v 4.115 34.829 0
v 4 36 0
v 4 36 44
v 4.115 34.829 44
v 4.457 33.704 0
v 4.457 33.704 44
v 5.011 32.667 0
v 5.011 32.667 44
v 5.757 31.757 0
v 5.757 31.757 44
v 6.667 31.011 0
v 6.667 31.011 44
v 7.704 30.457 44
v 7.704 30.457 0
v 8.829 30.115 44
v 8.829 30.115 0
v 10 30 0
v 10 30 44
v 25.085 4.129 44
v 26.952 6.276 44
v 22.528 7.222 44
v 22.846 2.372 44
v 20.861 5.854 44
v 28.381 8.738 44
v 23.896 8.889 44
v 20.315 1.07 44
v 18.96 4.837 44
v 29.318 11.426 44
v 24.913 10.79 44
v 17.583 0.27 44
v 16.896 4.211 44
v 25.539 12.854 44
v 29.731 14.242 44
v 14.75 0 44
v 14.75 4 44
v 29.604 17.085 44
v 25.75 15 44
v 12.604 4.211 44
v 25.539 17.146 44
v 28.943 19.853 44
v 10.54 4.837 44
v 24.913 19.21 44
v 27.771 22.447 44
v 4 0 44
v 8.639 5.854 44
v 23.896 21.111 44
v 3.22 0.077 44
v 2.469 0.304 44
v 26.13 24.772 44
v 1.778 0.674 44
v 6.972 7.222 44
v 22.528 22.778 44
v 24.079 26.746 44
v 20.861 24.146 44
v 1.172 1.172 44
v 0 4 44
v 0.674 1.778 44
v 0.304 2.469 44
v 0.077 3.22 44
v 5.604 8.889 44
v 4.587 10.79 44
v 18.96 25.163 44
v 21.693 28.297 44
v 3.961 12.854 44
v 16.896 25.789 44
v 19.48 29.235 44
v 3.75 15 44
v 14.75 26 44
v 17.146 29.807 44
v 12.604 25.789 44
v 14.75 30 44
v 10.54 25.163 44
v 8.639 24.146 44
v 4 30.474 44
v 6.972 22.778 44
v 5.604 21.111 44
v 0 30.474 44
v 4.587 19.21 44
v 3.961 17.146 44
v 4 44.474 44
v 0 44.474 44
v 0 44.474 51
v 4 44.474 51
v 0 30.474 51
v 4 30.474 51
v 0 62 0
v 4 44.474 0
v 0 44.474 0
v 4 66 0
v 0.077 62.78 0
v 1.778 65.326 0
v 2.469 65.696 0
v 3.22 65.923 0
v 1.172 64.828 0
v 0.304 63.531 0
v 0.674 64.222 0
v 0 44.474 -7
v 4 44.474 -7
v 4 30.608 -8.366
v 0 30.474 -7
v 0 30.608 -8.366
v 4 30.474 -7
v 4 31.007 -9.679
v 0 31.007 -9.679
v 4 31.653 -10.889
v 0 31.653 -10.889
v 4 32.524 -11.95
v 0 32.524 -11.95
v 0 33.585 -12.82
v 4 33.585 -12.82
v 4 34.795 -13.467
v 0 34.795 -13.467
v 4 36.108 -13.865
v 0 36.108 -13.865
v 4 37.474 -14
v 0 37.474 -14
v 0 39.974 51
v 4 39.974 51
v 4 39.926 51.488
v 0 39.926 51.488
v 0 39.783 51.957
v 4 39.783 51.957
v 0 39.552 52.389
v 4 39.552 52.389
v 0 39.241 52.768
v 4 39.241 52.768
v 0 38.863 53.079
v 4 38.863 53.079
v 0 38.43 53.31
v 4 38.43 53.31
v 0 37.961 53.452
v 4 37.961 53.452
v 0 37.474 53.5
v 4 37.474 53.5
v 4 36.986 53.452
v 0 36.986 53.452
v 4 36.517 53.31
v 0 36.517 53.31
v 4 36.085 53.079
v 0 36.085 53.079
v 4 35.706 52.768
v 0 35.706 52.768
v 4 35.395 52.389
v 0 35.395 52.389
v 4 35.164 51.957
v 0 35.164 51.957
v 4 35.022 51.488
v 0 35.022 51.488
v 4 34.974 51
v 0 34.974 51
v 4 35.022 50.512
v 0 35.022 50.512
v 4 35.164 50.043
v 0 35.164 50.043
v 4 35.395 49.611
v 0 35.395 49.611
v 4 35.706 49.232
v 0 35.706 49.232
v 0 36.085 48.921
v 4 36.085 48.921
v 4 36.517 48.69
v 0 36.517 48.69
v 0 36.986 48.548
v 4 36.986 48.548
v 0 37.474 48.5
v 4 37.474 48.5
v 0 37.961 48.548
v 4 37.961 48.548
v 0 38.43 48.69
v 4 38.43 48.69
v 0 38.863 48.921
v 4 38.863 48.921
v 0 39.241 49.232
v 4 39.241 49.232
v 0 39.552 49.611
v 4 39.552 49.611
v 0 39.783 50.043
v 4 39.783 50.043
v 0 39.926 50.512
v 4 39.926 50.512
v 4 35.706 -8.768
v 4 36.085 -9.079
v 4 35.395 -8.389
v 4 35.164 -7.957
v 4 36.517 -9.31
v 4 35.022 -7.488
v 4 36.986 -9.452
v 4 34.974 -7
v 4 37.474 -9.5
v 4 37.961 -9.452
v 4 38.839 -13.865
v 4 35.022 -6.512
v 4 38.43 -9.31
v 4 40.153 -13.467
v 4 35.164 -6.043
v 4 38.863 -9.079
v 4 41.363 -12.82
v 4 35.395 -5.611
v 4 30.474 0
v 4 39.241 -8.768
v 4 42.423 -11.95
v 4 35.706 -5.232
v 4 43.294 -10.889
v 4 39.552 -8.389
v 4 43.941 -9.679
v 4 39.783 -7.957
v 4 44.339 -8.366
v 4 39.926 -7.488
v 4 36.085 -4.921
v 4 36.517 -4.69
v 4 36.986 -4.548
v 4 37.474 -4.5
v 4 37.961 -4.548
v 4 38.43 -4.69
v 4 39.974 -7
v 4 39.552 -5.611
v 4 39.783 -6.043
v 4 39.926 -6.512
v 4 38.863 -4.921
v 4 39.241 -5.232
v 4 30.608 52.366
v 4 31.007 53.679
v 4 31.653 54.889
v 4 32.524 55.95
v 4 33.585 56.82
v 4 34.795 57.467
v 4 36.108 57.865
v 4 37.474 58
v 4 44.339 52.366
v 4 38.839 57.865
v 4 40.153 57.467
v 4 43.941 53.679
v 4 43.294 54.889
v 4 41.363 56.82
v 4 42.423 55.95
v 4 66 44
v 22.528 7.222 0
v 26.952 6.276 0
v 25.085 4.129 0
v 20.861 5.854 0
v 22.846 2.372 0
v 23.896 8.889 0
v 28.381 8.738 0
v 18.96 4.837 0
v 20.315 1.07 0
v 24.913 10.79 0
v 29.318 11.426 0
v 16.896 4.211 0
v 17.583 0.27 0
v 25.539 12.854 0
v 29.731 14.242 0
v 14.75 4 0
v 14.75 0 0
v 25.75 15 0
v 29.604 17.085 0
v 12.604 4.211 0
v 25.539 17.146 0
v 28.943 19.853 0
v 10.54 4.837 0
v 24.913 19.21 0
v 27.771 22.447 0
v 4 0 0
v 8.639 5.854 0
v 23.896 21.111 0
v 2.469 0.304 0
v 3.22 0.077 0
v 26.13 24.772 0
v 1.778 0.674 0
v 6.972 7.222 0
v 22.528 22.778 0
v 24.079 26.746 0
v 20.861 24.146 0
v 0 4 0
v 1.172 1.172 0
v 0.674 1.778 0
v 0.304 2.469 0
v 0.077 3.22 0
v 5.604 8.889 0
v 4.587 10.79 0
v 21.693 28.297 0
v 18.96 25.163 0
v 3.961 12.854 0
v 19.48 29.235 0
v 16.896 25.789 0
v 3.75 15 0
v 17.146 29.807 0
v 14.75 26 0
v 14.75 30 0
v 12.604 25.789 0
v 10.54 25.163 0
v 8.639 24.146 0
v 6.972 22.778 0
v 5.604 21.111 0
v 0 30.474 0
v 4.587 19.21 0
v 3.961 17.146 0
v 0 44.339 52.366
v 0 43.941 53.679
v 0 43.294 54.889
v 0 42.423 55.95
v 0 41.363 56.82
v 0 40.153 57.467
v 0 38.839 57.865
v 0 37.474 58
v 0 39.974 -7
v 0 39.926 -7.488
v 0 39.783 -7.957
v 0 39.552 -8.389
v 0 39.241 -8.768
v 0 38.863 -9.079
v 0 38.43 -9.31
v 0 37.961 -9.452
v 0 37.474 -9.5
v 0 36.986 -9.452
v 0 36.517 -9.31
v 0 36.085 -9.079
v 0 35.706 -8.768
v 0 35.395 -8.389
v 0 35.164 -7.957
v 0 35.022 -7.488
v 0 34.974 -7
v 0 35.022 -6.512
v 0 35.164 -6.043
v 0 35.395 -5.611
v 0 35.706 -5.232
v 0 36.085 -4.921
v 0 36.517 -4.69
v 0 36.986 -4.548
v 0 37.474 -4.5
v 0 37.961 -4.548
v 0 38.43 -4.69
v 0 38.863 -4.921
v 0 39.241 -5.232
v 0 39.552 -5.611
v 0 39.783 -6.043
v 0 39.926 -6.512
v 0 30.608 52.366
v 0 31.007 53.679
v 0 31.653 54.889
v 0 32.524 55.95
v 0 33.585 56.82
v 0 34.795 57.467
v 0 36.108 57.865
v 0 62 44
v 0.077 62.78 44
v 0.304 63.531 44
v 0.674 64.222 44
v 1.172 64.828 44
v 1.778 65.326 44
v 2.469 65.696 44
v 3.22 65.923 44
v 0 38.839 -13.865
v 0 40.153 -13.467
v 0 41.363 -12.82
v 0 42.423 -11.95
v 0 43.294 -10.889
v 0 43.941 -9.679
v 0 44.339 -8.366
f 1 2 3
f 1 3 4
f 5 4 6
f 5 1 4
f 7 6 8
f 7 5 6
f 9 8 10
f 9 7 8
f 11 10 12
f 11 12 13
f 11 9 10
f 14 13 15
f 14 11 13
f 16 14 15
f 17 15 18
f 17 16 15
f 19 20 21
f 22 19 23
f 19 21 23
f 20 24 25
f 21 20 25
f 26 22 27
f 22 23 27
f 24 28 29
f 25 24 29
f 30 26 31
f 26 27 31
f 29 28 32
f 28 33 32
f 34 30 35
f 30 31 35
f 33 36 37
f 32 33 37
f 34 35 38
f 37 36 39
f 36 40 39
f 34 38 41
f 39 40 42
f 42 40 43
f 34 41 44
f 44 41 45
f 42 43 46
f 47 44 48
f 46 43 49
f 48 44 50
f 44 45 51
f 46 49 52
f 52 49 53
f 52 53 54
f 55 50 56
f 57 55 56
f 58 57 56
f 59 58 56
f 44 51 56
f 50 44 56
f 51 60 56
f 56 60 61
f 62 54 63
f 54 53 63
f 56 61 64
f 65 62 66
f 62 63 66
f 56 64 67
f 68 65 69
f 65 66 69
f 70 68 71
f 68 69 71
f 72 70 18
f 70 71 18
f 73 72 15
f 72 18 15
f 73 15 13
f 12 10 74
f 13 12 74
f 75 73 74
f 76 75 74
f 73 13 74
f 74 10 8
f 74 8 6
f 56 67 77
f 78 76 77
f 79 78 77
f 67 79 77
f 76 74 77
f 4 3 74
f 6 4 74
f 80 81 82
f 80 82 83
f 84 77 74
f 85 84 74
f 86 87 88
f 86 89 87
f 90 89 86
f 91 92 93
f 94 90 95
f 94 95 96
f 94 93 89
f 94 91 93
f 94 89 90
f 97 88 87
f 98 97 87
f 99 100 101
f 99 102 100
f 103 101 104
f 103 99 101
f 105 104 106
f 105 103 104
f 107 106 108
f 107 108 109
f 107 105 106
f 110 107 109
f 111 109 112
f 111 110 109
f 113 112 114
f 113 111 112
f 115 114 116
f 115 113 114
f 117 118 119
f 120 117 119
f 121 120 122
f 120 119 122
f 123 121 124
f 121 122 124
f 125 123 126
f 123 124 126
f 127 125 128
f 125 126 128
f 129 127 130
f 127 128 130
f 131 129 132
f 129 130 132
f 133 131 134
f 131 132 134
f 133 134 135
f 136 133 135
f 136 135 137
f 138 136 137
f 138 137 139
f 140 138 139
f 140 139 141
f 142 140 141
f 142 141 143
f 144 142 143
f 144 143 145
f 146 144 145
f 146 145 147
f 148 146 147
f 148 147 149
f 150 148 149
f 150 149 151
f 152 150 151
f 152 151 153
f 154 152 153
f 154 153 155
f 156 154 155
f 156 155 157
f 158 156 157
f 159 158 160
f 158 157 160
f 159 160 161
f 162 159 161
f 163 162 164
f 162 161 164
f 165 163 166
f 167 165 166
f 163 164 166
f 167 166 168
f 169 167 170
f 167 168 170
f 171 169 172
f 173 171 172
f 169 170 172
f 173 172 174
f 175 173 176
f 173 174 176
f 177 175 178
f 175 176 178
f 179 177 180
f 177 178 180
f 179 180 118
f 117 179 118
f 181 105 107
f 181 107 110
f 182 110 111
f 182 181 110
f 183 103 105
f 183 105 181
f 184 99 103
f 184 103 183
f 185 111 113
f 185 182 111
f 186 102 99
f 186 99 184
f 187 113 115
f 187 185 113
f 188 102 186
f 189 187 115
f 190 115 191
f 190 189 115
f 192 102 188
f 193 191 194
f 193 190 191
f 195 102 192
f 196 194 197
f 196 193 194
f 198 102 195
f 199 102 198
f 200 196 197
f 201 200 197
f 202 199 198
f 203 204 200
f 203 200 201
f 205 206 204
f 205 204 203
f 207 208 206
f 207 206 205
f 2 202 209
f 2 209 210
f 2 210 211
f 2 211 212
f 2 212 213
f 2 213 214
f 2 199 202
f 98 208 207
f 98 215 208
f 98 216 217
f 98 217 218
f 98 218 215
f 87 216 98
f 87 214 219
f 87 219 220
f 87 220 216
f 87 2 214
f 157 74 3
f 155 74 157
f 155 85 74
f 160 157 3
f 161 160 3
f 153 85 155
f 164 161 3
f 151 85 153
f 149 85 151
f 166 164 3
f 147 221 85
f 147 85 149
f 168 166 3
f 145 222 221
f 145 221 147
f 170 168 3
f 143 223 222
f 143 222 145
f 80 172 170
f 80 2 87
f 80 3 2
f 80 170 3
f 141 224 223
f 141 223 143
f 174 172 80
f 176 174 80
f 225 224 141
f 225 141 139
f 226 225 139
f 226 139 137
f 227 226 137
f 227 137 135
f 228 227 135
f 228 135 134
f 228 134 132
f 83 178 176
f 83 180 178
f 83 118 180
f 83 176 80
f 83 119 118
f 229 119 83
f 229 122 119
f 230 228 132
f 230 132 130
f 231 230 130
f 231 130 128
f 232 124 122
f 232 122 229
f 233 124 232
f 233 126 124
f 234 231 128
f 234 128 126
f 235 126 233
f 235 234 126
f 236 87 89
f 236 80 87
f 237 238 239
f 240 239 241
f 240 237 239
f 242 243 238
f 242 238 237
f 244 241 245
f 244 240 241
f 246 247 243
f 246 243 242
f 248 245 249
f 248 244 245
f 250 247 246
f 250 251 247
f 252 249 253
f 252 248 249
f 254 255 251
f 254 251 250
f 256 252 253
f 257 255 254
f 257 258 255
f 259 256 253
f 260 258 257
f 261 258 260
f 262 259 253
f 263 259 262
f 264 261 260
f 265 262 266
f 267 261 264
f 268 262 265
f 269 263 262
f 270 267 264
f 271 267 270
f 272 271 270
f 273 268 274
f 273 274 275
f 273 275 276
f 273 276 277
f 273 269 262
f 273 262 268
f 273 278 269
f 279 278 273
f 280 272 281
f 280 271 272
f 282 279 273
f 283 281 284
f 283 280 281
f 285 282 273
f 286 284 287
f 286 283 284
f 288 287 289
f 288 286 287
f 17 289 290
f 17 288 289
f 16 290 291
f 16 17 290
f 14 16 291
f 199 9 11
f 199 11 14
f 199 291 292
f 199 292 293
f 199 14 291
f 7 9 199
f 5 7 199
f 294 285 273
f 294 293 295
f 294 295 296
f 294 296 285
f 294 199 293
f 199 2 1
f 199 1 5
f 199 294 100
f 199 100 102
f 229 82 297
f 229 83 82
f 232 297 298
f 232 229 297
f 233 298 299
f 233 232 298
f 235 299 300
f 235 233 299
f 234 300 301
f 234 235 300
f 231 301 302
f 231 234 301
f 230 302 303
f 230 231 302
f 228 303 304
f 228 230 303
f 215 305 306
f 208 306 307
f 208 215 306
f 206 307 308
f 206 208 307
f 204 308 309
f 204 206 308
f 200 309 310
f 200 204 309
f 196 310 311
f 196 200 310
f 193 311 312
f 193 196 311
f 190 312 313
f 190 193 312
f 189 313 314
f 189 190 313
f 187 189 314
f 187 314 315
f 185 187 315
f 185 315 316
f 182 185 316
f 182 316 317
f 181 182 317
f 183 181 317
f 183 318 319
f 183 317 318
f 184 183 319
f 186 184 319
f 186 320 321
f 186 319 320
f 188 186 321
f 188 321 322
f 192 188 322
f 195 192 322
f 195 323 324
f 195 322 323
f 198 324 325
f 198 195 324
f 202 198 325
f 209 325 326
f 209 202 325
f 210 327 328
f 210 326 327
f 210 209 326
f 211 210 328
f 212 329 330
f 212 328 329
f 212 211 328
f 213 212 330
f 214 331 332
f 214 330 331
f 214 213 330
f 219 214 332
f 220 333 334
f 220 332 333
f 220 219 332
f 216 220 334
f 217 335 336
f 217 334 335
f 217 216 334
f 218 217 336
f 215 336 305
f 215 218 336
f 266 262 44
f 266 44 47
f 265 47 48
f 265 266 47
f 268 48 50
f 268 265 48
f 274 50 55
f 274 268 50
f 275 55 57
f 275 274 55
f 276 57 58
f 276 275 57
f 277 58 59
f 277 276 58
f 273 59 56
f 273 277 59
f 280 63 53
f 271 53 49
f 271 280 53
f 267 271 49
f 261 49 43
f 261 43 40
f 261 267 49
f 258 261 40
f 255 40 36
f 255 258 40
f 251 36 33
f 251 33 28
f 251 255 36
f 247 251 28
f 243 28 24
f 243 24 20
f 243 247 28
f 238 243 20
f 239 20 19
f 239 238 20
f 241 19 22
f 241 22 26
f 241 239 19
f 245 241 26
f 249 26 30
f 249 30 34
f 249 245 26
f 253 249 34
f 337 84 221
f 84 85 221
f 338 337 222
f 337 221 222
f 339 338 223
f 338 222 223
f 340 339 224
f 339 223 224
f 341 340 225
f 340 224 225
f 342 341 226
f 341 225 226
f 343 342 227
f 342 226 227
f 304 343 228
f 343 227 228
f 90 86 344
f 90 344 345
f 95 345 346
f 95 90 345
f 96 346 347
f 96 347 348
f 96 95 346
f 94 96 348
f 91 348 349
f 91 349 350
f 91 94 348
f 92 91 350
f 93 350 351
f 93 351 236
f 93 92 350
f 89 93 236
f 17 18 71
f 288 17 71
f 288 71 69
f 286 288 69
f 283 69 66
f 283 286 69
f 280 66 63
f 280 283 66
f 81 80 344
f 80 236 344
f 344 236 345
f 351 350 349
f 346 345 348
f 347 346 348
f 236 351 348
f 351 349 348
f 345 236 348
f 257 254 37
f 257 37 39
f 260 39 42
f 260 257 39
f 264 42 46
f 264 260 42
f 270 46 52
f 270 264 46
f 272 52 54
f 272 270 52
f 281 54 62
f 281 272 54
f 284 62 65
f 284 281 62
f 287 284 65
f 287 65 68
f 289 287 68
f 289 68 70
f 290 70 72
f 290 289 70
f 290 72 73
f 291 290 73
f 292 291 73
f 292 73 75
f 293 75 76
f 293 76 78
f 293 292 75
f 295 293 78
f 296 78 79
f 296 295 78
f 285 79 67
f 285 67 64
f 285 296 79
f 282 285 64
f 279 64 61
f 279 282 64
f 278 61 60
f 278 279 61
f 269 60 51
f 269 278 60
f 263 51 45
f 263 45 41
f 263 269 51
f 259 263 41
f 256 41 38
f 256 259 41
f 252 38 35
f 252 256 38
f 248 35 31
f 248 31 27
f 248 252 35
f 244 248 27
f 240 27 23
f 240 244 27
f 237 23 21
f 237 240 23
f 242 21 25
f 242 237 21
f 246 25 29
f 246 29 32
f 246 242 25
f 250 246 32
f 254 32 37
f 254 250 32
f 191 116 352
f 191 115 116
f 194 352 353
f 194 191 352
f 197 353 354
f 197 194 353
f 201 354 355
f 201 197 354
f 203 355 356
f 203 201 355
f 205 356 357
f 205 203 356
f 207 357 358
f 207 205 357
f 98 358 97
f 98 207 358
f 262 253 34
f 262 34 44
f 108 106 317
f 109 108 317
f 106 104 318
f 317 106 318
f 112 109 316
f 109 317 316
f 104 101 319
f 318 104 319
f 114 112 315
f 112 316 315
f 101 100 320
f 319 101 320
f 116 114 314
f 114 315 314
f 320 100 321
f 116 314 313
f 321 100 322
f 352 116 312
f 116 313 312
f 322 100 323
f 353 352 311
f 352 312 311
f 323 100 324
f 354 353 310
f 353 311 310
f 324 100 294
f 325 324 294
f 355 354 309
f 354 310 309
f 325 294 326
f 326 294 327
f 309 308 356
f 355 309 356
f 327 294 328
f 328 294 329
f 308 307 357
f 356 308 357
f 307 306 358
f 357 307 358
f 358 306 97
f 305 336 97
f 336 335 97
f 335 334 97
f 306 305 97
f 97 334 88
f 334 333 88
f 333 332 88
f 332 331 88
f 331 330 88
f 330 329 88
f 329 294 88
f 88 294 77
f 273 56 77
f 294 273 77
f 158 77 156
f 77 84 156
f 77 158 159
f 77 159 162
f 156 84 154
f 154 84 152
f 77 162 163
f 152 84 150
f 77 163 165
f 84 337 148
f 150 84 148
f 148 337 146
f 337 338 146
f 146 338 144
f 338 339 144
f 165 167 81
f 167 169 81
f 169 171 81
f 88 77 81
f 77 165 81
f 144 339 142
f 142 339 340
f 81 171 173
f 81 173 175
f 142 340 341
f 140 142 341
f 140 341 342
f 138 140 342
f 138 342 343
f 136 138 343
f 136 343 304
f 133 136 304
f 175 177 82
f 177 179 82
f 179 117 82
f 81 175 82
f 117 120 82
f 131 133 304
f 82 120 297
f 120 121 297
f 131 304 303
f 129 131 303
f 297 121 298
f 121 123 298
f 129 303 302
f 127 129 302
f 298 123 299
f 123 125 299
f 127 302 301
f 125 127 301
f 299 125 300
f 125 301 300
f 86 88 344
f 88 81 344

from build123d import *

# Parameters (mm, degrees)
SKETCH2_R            = 11
BOSS_EXTRUDE1_DEPTH  = 44
SKETCH5_W            = 4
SKETCH5_H            = 14
BOSS_EXTRUDE3_DEPTH  = 14
FILLET3_R            = 7
SKETCH6_R            = 2.5
CUT_EXTRUDE2_DEPTH   = 14
FILLET3_OF_MIRROR2_R = 7


with BuildPart() as part:
    # Sketch2 → Boss-Extrude1 (new body)
    with BuildSketch(Plane.XY):
        with BuildLine():
            Line((0, 4), (0, 62))
            ThreePointArc((0, 62), (1.171572875, 64.828427125), (4, 66))
            Line((4, 66), (4, 36))
            ThreePointArc((4, 36), (5.757359313, 31.757359313), (10, 30))
            Line((10, 30), (14.75, 30))
            ThreePointArc((14.75, 30), (18.324268314, 29.567930739), (21.692625765, 28.296614136))
            ThreePointArc((21.692625765, 28.296614136), (29.317930739, 11.425731686), (14.75, 0))
            Line((14.75, 0), (4, 0))
            ThreePointArc((4, 0), (1.171572875, 1.171572875), (0, 4))
        make_face()
        with Locations((14.75, 15)):
            Circle(SKETCH2_R, mode=Mode.SUBTRACT)
    extrude(amount=BOSS_EXTRUDE1_DEPTH)

    # Sketch5 → Boss-Extrude3 (add)
    with BuildSketch(Plane.XY.offset(44)):
        with Locations((2, 37.473717009)):
            Rectangle(SKETCH5_W, SKETCH5_H)
    boss_extrude3 = extrude(amount=BOSS_EXTRUDE3_DEPTH)

    # Fillet3
    fillet3_edges = [part.edges().sort_by_distance(p)[0] for p in [
        (2, 30.473717009, 58),
        (2, 44.473717009, 58),
    ]]
    fillet(fillet3_edges, radius=FILLET3_R - 0.0001)  # a hair under: the kernel refuses the full size

    # Sketch6 → Cut-Extrude2 (cut)
    with BuildSketch(Plane(origin=(4, 0, 0), x_dir=(0, 0, -1), z_dir=(1, 0, 0))):
        with Locations(Location((-51, 37.473717009, 0), (0, 0, 90))):
            Circle(SKETCH6_R)
    cut_extrude2 = extrude(amount=-CUT_EXTRUDE2_DEPTH, mode=Mode.SUBTRACT)

    # Mirror2: Boss-Extrude3, Cut-Extrude2 across plane
    add(boss_extrude3.mirror(Plane(origin=(0, 0, 22), x_dir=(1, 0, 0), z_dir=(0, 0, -1))))
    add(cut_extrude2.mirror(Plane(origin=(0, 0, 22), x_dir=(1, 0, 0), z_dir=(0, 0, -1))), mode=Mode.SUBTRACT)

    # Fillet3 of Mirror2
    fillet3_of_mirror2_edges = [part.edges().sort_by_distance(p)[0] for p in [
        (2, 30.473717009, -14),
        (2, 44.473717009, -14),
    ]]
    fillet(fillet3_of_mirror2_edges, radius=FILLET3_OF_MIRROR2_R - 0.0001)  # a hair under: the kernel refuses the full size


solid = part.part
